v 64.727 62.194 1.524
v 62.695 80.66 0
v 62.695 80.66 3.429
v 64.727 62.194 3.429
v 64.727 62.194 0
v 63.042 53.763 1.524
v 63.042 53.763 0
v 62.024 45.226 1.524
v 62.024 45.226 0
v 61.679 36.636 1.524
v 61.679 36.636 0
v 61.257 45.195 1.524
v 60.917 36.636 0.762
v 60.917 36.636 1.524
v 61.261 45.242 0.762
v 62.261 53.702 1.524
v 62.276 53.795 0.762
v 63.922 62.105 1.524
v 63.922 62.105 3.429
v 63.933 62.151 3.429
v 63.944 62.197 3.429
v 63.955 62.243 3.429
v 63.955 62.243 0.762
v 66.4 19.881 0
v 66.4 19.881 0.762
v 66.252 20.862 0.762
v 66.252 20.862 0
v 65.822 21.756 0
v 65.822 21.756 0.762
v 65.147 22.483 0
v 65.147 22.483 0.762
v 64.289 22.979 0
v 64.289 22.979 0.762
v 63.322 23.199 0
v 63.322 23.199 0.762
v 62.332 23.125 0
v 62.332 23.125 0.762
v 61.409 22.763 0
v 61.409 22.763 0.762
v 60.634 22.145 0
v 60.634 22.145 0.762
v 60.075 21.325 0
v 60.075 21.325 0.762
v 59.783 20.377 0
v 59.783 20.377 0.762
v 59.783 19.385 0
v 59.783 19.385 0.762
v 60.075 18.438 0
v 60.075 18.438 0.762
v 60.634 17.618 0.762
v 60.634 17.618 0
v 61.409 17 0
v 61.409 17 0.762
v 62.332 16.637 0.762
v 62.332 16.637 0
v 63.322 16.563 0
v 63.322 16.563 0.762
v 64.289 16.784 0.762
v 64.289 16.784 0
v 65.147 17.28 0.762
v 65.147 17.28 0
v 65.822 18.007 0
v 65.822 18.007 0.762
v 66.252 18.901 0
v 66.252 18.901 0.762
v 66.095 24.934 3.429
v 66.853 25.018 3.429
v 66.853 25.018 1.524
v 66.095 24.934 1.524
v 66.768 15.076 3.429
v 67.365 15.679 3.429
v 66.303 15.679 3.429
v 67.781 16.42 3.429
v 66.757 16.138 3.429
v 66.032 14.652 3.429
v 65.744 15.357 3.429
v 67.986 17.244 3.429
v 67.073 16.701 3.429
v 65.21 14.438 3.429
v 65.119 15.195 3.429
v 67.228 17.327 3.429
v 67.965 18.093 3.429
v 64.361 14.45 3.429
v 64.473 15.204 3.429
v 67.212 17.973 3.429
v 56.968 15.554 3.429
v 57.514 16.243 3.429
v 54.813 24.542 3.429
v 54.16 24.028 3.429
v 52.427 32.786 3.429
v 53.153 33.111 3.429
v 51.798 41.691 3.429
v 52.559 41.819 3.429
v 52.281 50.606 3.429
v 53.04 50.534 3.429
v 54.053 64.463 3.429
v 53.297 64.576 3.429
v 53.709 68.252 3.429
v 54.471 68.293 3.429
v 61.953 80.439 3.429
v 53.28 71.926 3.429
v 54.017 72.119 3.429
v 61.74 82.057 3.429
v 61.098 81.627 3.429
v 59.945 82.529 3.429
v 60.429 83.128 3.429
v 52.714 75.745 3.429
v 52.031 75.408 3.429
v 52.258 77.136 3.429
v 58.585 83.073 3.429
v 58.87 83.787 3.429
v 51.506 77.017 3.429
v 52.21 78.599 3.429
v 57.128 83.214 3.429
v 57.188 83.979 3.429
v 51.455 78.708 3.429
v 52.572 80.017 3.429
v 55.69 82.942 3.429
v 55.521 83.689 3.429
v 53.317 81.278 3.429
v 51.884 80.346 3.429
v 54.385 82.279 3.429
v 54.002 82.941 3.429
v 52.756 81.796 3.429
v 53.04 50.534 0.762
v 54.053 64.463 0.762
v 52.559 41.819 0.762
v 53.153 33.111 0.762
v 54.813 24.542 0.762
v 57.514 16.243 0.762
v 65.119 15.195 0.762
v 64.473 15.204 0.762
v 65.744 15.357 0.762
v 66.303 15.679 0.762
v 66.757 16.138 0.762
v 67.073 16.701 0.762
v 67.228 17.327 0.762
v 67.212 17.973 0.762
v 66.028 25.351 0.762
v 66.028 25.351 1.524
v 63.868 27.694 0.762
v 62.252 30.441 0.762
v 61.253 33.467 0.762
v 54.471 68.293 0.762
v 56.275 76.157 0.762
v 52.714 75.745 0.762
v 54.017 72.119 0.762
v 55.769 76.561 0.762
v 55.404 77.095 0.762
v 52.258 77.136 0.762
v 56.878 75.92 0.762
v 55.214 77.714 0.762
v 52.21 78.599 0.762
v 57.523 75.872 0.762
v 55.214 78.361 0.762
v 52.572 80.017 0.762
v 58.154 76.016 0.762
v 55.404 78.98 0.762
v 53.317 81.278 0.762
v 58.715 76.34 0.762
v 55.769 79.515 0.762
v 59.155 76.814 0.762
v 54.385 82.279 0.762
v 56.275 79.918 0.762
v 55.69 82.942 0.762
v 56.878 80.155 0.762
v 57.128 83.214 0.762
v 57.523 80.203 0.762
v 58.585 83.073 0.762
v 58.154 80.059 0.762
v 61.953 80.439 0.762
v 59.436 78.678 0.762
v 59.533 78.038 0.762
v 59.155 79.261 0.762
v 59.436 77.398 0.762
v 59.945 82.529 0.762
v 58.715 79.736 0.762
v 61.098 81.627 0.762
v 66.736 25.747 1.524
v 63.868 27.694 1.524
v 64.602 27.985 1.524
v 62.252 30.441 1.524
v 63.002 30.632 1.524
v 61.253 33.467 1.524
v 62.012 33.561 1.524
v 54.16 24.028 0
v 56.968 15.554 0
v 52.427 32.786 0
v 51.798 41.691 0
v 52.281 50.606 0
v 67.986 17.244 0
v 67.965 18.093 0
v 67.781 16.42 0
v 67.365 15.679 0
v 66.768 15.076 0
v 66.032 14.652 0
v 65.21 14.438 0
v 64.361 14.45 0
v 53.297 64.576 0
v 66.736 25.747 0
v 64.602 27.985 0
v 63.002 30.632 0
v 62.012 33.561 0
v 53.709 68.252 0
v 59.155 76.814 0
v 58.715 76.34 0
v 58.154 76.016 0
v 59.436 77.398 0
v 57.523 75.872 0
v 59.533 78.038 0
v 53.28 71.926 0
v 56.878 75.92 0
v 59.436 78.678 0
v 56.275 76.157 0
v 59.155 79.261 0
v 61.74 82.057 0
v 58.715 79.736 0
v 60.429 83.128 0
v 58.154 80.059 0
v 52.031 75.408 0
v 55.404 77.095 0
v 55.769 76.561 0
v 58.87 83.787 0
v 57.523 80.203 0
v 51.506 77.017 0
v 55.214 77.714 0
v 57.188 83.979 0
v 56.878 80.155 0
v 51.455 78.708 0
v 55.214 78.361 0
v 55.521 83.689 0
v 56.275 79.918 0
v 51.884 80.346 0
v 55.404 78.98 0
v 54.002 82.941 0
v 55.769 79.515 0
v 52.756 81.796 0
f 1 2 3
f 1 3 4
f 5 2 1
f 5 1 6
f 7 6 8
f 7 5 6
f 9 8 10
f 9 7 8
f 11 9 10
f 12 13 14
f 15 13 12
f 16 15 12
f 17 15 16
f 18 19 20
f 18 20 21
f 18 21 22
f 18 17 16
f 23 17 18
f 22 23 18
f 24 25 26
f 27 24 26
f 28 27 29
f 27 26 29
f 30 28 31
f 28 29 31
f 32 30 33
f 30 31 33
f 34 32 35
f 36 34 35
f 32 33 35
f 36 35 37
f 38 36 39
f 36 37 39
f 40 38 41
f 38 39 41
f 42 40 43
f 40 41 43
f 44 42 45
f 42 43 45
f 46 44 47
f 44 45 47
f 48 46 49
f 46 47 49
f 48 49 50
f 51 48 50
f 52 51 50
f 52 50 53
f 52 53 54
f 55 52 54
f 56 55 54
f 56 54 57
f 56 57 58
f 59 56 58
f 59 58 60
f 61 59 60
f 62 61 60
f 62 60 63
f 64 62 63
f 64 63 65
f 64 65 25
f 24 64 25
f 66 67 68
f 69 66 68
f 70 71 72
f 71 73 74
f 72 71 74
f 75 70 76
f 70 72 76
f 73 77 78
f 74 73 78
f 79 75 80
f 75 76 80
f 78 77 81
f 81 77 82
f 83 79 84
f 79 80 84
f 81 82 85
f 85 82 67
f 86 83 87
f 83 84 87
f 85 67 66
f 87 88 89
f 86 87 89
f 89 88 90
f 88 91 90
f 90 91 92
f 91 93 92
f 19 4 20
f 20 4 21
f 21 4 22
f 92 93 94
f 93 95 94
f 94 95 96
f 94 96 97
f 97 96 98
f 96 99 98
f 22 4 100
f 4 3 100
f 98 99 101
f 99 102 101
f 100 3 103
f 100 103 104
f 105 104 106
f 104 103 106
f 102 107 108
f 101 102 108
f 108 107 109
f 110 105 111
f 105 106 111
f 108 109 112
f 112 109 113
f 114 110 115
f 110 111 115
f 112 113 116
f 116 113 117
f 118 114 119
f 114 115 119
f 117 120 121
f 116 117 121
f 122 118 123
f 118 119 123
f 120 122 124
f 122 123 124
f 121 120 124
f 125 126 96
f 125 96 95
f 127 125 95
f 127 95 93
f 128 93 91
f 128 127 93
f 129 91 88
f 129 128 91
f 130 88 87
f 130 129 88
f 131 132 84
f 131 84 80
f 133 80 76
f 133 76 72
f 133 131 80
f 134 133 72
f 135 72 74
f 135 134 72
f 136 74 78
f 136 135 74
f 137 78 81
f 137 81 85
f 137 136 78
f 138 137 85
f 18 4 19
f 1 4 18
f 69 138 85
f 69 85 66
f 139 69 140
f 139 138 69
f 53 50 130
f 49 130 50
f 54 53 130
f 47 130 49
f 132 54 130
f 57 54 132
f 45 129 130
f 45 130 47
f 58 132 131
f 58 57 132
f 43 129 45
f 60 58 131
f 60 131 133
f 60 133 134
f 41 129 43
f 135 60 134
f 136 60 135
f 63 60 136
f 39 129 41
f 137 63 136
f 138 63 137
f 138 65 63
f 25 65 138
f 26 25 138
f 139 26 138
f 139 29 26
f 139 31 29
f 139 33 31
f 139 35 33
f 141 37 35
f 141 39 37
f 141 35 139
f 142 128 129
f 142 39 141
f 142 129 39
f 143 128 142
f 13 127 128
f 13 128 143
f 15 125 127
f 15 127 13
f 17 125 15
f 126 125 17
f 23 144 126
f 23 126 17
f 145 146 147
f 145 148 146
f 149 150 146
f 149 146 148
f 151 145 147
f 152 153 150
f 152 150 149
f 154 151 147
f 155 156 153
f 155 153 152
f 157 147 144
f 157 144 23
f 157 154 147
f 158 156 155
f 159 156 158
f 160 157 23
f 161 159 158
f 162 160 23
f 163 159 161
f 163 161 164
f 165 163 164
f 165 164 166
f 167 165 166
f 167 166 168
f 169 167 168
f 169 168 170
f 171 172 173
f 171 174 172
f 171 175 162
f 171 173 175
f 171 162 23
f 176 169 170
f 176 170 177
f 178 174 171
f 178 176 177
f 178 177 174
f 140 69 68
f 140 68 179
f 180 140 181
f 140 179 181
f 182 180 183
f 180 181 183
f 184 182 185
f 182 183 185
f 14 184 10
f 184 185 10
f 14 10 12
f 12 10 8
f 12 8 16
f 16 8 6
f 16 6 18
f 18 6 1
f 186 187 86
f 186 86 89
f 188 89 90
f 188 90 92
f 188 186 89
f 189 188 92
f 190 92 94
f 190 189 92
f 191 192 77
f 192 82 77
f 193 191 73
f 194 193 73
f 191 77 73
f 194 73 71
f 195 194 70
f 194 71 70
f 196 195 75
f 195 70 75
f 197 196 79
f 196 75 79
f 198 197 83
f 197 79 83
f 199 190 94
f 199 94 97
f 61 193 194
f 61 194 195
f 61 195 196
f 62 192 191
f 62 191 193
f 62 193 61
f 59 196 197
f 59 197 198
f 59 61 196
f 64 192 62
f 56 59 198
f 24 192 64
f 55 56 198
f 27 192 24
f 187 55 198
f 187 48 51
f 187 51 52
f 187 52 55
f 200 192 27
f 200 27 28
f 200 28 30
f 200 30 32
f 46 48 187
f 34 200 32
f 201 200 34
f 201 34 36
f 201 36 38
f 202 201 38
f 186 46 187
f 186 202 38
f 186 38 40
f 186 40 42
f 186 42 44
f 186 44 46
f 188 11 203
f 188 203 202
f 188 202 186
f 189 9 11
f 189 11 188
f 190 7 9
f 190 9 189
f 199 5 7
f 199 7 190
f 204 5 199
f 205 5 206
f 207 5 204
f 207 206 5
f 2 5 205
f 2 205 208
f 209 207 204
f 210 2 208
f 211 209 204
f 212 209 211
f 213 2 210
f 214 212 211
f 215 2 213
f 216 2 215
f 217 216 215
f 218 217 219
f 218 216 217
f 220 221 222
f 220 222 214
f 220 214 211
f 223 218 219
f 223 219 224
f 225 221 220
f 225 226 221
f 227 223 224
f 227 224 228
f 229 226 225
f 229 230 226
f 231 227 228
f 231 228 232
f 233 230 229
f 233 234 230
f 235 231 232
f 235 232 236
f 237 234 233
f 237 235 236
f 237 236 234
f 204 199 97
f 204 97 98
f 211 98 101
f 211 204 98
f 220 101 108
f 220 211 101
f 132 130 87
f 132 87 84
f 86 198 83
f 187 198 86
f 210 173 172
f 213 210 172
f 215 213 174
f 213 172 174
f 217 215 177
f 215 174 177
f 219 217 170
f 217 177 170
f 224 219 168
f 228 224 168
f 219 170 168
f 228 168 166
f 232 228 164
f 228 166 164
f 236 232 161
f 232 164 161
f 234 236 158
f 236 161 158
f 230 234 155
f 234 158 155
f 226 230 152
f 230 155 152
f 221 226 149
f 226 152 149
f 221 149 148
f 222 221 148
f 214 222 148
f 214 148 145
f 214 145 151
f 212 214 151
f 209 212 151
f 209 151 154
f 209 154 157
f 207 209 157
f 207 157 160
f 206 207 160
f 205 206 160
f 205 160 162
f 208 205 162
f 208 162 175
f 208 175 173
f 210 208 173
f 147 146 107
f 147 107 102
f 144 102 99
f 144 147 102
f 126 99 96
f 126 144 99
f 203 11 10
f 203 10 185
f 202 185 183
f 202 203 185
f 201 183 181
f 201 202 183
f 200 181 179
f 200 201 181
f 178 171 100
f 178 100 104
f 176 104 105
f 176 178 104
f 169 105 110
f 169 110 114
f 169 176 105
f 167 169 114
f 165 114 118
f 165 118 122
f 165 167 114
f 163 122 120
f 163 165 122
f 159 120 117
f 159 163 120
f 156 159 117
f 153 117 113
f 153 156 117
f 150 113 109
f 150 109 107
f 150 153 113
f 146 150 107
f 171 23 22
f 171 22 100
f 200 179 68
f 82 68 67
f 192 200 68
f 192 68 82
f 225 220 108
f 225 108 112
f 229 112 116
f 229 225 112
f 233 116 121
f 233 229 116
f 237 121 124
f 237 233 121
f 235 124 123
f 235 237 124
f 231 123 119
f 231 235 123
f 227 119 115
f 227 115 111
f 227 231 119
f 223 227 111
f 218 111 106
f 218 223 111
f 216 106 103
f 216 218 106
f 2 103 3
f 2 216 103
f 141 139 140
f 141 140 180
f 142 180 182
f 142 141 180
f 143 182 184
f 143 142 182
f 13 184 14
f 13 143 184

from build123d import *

# Parameters (mm, degrees)
BOSS_EXTRUDE1_DEPTH = 3.429
FILLET1_R           = 3.175
SHELL1_START        = 0.762
SHELL1_DEPTH        = 2.667
SKETCH2_R           = 2.1717
SKETCH2_R_2         = 3.3274
CUT_EXTRUDE1_DEPTH  = 109.116950745
SKETCH4_W           = 1.905
SKETCH4_H           = 37.1856
CUT_EXTRUDE3_DEPTH  = 8.509


# Read off the part's stored shape, not the designer's step: Shell1
with BuildPart() as part:
    # Sketch1 → Boss-Extrude1 (new body)
    with BuildSketch(Plane.XY):
        with BuildLine():
            Line((62.694975666, 80.659735828), (64.726975666, 62.193935828))
            ThreePointArc((64.726975666, 62.193935828), (62.449213934, 49.504733029), (61.678975666, 36.635747087))
            ThreePointArc((61.678975666, 36.635747087), (63.002494237, 30.6317877), (66.736169072, 25.747230203))
            Line((66.736169072, 25.747230203), (68.652274874, 13.809230203))
            Line((68.652274874, 13.809230203), (56.968274874, 15.553747087))
            ThreePointArc((56.968274874, 15.553747087), (52.42740055, 32.785925059), (52.280975666, 50.605747087))
            Line((52.280975666, 50.605747087), (53.296975666, 64.575747087))
            ThreePointArc((53.296975666, 64.575747087), (53.599423451, 70.100985632), (52.031009659, 75.407567754))
            ThreePointArc((52.031009659, 75.407567754), (54.734890855, 83.369731663), (62.694975666, 80.659735828))
        make_face()
    extrude(amount=BOSS_EXTRUDE1_DEPTH)

    # Fillet1
    fillet1_edges = [part.edges().sort_by_distance(p)[0] for p in [
        (68.652274874, 13.809230203, 1.7145),
    ]]
    fillet(fillet1_edges, radius=FILLET1_R)

    # Shell1 outline → Shell1 (cut)
    with BuildSketch(Plane.XY.offset(SHELL1_START)):
        with BuildLine():
            ThreePointArc((61.952685119, 80.438826605), (55.013786801, 82.65723656), (52.714338634, 75.744770233))
            ThreePointArc((52.714338634, 75.744770233), (54.352815027, 70.218797874), (54.052777411, 64.462848531))
            Line((54.052777411, 64.462848531), (53.039751684, 50.533744782))
            ThreePointArc((53.039751684, 50.533744782), (53.153060273, 33.111126197), (57.513949579, 16.242720176))
            Line((57.513949579, 16.242720176), (64.473451012, 15.203609619))
            ThreePointArc((64.473451012, 15.203609619), (66.545332993, 15.893259626), (67.212288081, 17.972558303))
            Line((67.212288081, 17.972558303), (66.027992544, 25.351127953))
            ThreePointArc((66.027992544, 25.351127953), (62.25173003, 30.440896905), (60.916975951, 36.636406417))
            ThreePointArc((60.916975951, 36.636406417), (61.6846952, 49.528718986), (63.955003411, 62.242759133))
            Line((63.955003411, 62.242759133), (61.952685119, 80.438826605))
        make_face()
    extrude(amount=SHELL1_DEPTH, mode=Mode.SUBTRACT)

    # Sketch2 → Cut-Extrude1 (cut, through all)
    with BuildSketch(Plane.XY.offset(3.429)):
        with Locations((57.360975666, 78.037747087)):
            Circle(SKETCH2_R)
        with Locations((63.072884184, 19.881317109)):
            Circle(SKETCH2_R_2)
    extrude(amount=-CUT_EXTRUDE1_DEPTH, mode=Mode.SUBTRACT)

    # Sketch4 → Cut-Extrude3 (cut)
    with BuildSketch(Plane(origin=(70.714586477, 7.781522583, 0), x_dir=(0, 0, -1), z_dir=(0.9939998970848155, 0.1093810065567881, 0))):
        with Locations((-2.4765, 36.148064063)):
            Rectangle(SKETCH4_W, SKETCH4_H)
    extrude(amount=-CUT_EXTRUDE3_DEPTH, mode=Mode.SUBTRACT)


solid = part.part
